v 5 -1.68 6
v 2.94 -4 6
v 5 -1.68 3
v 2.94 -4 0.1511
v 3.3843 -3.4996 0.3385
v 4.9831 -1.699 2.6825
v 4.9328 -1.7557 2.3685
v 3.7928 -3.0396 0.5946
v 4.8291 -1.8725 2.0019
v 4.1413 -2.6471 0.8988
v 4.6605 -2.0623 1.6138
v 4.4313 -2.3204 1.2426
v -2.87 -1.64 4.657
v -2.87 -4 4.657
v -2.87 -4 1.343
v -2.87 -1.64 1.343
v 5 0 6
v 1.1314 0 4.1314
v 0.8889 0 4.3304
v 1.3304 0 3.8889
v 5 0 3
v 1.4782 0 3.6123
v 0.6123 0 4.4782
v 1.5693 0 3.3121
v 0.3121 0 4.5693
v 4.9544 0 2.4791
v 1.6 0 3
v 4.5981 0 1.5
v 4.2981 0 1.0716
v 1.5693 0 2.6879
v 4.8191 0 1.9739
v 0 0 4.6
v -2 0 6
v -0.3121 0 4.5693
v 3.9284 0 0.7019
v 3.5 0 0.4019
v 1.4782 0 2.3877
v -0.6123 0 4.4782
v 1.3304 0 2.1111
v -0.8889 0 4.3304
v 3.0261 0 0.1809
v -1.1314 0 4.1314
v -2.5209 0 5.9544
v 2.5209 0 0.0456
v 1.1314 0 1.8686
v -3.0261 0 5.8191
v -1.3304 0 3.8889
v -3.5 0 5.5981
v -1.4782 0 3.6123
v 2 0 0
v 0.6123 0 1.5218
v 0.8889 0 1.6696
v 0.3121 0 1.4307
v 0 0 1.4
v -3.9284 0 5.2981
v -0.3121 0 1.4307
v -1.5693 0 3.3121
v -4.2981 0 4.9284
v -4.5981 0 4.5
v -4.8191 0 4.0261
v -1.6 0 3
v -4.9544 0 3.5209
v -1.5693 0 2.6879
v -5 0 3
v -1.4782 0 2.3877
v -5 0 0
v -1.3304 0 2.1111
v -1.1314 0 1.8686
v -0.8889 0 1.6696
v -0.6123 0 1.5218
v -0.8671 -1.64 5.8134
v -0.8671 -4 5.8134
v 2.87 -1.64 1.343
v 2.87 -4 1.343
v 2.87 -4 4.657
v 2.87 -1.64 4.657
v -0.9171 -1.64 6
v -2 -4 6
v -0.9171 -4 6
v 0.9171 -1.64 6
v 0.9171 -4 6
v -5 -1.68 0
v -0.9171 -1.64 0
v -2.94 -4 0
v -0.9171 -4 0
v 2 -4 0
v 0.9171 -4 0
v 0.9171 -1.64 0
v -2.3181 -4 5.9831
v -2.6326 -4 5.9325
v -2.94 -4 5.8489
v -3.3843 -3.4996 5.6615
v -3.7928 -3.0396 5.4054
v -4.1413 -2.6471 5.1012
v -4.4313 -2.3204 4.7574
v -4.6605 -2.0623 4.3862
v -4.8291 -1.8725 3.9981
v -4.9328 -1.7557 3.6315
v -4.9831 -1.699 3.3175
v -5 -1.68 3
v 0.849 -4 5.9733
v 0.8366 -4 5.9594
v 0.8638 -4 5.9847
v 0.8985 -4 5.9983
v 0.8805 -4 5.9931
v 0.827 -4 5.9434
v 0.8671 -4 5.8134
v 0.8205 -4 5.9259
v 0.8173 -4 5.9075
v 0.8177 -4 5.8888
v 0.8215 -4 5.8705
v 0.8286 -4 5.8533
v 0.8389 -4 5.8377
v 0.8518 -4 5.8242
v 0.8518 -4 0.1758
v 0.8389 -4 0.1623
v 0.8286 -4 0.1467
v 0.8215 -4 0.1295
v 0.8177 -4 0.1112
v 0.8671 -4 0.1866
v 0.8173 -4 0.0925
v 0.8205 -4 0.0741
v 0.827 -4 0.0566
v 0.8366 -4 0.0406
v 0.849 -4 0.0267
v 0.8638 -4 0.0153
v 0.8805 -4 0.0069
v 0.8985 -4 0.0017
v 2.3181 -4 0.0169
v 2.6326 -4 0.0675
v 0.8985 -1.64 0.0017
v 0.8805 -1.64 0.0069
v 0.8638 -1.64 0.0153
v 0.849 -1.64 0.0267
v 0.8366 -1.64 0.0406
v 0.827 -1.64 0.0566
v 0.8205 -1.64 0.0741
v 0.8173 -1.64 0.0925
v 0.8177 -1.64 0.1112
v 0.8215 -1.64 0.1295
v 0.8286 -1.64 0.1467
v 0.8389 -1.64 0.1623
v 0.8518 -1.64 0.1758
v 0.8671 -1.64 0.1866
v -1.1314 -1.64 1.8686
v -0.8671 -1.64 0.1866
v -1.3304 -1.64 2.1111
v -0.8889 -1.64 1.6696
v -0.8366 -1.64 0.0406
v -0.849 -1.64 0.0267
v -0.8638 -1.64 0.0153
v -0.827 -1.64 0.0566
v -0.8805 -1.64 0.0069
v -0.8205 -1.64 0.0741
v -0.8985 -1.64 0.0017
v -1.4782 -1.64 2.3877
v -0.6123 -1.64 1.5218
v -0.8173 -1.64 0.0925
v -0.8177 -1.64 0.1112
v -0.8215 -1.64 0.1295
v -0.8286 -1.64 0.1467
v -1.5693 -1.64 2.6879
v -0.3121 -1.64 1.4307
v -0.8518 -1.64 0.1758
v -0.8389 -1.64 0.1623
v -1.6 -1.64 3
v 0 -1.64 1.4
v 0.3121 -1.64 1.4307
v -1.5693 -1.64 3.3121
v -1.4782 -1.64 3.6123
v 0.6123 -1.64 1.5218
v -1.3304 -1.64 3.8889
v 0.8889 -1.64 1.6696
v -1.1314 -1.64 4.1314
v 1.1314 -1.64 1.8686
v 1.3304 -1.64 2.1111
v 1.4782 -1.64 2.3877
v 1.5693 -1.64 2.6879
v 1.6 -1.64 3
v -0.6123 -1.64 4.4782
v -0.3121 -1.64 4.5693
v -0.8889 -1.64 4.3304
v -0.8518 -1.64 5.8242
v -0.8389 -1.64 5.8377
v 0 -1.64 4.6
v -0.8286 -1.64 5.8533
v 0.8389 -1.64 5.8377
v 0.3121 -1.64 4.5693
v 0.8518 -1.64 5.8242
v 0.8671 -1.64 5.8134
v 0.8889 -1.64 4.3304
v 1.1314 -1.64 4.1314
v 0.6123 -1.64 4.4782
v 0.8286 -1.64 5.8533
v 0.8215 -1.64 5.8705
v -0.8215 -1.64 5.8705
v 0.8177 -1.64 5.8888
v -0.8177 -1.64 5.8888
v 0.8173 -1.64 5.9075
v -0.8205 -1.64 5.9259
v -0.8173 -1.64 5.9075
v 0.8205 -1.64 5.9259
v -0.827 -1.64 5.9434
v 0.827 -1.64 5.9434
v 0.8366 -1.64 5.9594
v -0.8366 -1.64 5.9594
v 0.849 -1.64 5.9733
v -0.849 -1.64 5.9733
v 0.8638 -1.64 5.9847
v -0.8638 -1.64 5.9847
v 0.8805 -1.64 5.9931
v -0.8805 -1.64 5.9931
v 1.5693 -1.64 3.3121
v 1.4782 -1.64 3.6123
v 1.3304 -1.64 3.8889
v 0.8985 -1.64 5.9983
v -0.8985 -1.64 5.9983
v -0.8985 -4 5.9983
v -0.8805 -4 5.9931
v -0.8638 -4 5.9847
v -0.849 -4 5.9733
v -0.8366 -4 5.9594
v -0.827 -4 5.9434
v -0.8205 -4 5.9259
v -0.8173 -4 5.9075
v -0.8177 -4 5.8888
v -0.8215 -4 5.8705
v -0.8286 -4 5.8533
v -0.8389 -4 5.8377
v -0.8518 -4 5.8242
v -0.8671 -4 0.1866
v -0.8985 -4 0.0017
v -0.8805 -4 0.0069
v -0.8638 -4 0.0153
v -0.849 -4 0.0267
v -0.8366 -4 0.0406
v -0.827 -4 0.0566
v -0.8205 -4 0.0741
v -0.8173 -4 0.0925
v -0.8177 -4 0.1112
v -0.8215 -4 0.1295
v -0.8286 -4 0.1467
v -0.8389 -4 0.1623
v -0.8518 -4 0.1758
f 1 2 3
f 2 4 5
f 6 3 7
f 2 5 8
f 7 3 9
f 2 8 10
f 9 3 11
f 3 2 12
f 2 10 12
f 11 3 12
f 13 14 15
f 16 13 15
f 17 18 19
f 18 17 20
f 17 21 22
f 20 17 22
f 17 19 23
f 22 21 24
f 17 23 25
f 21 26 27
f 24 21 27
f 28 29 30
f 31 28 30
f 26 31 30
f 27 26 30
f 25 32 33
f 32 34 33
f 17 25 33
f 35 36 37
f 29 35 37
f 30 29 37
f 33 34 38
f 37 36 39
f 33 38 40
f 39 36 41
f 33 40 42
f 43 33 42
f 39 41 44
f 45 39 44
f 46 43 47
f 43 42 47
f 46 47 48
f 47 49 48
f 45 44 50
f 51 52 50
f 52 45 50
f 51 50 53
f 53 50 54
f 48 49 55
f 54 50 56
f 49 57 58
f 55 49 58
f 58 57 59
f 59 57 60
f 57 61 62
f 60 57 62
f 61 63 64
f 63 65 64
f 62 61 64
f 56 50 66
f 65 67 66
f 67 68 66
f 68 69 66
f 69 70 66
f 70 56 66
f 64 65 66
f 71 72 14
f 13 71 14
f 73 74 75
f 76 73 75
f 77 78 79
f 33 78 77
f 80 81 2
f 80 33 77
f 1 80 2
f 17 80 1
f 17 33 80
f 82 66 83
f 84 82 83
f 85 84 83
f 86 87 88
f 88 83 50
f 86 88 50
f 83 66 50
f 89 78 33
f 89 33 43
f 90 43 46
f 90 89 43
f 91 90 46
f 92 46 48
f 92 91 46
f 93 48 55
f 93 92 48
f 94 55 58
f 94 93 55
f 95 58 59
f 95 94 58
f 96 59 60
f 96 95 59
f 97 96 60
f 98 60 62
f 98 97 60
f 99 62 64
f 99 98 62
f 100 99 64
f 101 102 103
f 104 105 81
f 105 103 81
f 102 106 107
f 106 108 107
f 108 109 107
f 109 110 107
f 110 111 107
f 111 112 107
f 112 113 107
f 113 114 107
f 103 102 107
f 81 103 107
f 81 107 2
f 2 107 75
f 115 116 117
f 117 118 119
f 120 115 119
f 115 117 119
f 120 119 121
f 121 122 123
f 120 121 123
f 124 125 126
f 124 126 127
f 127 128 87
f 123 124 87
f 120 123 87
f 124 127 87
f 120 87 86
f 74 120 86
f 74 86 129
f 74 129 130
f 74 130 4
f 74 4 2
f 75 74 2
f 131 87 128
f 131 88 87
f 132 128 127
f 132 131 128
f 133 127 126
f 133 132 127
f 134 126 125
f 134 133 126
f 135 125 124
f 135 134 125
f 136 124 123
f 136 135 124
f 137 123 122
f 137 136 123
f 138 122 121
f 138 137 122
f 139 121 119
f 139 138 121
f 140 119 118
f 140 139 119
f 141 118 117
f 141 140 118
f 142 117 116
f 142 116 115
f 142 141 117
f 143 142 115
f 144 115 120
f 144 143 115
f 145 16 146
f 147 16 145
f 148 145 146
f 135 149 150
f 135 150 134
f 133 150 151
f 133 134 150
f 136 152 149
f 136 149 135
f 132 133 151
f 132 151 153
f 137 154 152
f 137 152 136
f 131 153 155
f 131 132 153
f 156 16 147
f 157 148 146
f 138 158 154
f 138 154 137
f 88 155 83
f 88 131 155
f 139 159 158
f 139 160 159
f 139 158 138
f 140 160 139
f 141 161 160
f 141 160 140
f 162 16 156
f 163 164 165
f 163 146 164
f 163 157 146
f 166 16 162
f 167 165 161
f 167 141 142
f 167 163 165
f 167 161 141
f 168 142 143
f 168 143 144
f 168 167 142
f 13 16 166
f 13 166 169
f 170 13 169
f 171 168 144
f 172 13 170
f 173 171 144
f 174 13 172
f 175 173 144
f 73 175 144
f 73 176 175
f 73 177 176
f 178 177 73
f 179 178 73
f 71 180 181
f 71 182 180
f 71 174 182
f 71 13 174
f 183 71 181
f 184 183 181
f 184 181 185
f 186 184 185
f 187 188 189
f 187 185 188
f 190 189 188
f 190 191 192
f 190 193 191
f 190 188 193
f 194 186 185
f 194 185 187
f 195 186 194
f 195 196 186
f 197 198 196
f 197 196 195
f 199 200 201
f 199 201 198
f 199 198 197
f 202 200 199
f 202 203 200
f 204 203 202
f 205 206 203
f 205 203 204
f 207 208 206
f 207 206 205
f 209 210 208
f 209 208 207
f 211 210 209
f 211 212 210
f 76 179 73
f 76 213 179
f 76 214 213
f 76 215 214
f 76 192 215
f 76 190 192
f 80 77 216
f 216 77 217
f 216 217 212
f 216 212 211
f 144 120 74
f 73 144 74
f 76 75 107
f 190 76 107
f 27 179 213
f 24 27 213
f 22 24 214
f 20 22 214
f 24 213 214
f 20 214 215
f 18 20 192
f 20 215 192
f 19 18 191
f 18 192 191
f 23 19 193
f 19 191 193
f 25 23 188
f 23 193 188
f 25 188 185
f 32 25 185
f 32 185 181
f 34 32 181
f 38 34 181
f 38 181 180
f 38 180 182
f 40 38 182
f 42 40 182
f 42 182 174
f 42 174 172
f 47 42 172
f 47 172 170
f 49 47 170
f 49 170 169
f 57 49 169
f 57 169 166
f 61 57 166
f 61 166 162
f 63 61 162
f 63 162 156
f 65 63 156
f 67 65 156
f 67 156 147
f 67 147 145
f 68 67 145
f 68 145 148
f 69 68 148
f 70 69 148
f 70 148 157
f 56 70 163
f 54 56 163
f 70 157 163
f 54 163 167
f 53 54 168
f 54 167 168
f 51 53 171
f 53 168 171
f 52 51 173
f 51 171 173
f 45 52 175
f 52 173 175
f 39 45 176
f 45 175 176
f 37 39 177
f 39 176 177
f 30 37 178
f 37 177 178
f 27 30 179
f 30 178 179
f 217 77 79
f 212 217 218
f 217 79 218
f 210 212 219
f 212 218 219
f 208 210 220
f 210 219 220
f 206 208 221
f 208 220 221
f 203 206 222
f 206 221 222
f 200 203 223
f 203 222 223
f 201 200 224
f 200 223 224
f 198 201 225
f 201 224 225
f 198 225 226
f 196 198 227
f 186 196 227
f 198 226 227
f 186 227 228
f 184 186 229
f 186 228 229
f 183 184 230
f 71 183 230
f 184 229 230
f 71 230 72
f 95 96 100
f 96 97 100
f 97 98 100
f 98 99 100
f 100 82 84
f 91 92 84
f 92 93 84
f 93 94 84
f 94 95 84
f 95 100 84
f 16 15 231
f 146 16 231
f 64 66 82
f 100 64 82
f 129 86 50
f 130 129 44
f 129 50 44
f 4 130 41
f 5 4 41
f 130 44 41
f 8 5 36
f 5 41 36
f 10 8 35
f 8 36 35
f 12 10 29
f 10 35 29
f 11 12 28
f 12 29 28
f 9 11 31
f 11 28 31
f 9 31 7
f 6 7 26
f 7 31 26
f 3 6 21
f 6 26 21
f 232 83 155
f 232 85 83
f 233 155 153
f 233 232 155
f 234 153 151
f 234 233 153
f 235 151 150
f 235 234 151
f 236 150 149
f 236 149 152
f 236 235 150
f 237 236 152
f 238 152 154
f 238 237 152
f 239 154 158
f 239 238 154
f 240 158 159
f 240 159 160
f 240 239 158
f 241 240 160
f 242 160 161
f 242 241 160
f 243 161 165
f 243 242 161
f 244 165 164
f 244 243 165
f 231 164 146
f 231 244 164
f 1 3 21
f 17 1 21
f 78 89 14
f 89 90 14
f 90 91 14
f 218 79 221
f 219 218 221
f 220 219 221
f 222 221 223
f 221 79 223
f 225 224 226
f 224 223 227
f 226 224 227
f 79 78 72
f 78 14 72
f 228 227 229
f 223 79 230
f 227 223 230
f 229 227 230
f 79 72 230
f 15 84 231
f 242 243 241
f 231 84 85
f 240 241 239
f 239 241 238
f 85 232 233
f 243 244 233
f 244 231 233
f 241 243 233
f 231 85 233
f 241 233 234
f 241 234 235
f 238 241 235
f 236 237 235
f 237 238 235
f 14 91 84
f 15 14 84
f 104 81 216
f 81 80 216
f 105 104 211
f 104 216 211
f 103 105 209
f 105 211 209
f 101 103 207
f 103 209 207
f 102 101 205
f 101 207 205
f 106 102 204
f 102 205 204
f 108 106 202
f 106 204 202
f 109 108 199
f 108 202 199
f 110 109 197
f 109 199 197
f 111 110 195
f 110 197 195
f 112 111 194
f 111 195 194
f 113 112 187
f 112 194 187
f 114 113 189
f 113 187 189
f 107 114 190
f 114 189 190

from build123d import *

# Parameters (mm, degrees)
PAD_DEPTH       = 6
SKETCH001_R     = 1.6
POCKET_DEPTH    = 4.001
POCKET001_DEPTH = 2.36
FILLET_R        = 0.1
FILLET001_R     = 3


with BuildPart() as part:
    # Sketch → Pad (new body)
    with BuildSketch(Plane.XY):
        Polygon((0, 0), (-5, 0), (-5, -1.68), (-2.94, -4), (0, -4), (2.94, -4), (5, -1.68), (5, 0), align=None)
    extrude(amount=PAD_DEPTH)

    # Sketch001 (on Face5 of Pad) → Pocket (cut, through all)
    with BuildSketch(Plane.XZ.offset(4)):
        with Locations((0, 3)):
            Circle(SKETCH001_R)
    extrude(amount=-POCKET_DEPTH, mode=Mode.SUBTRACT)

    # Sketch002 (on Face8 of Pocket) → Pocket001 (cut)
    with BuildSketch(Plane.XZ.offset(4)):
        Polygon((-2.87, 4.656995), (-2.87, 1.343005), (0, -0.313991), (2.87, 1.343005), (2.87, 4.656995), (0, 6.313991), align=None)
    extrude(amount=-POCKET001_DEPTH, mode=Mode.SUBTRACT)

    # Fillet
    fillet_edges = [part.edges().sort_by_distance(p)[0] for p in [
        (-0.543848, -2.82, 6),
        (0.543848, -2.82, 6),
        (0.543848, -2.82, 0),
        (-0.543848, -2.82, 0),
    ]]
    fillet(fillet_edges, radius=FILLET_R)

    # Fillet001
    fillet001_edges = [part.edges().sort_by_distance(p)[0] for p in [
        (5, -0.84, 0),
        (-5, -0.84, 6),
    ]]
    fillet(fillet001_edges, radius=FILLET001_R)


solid = part.part
